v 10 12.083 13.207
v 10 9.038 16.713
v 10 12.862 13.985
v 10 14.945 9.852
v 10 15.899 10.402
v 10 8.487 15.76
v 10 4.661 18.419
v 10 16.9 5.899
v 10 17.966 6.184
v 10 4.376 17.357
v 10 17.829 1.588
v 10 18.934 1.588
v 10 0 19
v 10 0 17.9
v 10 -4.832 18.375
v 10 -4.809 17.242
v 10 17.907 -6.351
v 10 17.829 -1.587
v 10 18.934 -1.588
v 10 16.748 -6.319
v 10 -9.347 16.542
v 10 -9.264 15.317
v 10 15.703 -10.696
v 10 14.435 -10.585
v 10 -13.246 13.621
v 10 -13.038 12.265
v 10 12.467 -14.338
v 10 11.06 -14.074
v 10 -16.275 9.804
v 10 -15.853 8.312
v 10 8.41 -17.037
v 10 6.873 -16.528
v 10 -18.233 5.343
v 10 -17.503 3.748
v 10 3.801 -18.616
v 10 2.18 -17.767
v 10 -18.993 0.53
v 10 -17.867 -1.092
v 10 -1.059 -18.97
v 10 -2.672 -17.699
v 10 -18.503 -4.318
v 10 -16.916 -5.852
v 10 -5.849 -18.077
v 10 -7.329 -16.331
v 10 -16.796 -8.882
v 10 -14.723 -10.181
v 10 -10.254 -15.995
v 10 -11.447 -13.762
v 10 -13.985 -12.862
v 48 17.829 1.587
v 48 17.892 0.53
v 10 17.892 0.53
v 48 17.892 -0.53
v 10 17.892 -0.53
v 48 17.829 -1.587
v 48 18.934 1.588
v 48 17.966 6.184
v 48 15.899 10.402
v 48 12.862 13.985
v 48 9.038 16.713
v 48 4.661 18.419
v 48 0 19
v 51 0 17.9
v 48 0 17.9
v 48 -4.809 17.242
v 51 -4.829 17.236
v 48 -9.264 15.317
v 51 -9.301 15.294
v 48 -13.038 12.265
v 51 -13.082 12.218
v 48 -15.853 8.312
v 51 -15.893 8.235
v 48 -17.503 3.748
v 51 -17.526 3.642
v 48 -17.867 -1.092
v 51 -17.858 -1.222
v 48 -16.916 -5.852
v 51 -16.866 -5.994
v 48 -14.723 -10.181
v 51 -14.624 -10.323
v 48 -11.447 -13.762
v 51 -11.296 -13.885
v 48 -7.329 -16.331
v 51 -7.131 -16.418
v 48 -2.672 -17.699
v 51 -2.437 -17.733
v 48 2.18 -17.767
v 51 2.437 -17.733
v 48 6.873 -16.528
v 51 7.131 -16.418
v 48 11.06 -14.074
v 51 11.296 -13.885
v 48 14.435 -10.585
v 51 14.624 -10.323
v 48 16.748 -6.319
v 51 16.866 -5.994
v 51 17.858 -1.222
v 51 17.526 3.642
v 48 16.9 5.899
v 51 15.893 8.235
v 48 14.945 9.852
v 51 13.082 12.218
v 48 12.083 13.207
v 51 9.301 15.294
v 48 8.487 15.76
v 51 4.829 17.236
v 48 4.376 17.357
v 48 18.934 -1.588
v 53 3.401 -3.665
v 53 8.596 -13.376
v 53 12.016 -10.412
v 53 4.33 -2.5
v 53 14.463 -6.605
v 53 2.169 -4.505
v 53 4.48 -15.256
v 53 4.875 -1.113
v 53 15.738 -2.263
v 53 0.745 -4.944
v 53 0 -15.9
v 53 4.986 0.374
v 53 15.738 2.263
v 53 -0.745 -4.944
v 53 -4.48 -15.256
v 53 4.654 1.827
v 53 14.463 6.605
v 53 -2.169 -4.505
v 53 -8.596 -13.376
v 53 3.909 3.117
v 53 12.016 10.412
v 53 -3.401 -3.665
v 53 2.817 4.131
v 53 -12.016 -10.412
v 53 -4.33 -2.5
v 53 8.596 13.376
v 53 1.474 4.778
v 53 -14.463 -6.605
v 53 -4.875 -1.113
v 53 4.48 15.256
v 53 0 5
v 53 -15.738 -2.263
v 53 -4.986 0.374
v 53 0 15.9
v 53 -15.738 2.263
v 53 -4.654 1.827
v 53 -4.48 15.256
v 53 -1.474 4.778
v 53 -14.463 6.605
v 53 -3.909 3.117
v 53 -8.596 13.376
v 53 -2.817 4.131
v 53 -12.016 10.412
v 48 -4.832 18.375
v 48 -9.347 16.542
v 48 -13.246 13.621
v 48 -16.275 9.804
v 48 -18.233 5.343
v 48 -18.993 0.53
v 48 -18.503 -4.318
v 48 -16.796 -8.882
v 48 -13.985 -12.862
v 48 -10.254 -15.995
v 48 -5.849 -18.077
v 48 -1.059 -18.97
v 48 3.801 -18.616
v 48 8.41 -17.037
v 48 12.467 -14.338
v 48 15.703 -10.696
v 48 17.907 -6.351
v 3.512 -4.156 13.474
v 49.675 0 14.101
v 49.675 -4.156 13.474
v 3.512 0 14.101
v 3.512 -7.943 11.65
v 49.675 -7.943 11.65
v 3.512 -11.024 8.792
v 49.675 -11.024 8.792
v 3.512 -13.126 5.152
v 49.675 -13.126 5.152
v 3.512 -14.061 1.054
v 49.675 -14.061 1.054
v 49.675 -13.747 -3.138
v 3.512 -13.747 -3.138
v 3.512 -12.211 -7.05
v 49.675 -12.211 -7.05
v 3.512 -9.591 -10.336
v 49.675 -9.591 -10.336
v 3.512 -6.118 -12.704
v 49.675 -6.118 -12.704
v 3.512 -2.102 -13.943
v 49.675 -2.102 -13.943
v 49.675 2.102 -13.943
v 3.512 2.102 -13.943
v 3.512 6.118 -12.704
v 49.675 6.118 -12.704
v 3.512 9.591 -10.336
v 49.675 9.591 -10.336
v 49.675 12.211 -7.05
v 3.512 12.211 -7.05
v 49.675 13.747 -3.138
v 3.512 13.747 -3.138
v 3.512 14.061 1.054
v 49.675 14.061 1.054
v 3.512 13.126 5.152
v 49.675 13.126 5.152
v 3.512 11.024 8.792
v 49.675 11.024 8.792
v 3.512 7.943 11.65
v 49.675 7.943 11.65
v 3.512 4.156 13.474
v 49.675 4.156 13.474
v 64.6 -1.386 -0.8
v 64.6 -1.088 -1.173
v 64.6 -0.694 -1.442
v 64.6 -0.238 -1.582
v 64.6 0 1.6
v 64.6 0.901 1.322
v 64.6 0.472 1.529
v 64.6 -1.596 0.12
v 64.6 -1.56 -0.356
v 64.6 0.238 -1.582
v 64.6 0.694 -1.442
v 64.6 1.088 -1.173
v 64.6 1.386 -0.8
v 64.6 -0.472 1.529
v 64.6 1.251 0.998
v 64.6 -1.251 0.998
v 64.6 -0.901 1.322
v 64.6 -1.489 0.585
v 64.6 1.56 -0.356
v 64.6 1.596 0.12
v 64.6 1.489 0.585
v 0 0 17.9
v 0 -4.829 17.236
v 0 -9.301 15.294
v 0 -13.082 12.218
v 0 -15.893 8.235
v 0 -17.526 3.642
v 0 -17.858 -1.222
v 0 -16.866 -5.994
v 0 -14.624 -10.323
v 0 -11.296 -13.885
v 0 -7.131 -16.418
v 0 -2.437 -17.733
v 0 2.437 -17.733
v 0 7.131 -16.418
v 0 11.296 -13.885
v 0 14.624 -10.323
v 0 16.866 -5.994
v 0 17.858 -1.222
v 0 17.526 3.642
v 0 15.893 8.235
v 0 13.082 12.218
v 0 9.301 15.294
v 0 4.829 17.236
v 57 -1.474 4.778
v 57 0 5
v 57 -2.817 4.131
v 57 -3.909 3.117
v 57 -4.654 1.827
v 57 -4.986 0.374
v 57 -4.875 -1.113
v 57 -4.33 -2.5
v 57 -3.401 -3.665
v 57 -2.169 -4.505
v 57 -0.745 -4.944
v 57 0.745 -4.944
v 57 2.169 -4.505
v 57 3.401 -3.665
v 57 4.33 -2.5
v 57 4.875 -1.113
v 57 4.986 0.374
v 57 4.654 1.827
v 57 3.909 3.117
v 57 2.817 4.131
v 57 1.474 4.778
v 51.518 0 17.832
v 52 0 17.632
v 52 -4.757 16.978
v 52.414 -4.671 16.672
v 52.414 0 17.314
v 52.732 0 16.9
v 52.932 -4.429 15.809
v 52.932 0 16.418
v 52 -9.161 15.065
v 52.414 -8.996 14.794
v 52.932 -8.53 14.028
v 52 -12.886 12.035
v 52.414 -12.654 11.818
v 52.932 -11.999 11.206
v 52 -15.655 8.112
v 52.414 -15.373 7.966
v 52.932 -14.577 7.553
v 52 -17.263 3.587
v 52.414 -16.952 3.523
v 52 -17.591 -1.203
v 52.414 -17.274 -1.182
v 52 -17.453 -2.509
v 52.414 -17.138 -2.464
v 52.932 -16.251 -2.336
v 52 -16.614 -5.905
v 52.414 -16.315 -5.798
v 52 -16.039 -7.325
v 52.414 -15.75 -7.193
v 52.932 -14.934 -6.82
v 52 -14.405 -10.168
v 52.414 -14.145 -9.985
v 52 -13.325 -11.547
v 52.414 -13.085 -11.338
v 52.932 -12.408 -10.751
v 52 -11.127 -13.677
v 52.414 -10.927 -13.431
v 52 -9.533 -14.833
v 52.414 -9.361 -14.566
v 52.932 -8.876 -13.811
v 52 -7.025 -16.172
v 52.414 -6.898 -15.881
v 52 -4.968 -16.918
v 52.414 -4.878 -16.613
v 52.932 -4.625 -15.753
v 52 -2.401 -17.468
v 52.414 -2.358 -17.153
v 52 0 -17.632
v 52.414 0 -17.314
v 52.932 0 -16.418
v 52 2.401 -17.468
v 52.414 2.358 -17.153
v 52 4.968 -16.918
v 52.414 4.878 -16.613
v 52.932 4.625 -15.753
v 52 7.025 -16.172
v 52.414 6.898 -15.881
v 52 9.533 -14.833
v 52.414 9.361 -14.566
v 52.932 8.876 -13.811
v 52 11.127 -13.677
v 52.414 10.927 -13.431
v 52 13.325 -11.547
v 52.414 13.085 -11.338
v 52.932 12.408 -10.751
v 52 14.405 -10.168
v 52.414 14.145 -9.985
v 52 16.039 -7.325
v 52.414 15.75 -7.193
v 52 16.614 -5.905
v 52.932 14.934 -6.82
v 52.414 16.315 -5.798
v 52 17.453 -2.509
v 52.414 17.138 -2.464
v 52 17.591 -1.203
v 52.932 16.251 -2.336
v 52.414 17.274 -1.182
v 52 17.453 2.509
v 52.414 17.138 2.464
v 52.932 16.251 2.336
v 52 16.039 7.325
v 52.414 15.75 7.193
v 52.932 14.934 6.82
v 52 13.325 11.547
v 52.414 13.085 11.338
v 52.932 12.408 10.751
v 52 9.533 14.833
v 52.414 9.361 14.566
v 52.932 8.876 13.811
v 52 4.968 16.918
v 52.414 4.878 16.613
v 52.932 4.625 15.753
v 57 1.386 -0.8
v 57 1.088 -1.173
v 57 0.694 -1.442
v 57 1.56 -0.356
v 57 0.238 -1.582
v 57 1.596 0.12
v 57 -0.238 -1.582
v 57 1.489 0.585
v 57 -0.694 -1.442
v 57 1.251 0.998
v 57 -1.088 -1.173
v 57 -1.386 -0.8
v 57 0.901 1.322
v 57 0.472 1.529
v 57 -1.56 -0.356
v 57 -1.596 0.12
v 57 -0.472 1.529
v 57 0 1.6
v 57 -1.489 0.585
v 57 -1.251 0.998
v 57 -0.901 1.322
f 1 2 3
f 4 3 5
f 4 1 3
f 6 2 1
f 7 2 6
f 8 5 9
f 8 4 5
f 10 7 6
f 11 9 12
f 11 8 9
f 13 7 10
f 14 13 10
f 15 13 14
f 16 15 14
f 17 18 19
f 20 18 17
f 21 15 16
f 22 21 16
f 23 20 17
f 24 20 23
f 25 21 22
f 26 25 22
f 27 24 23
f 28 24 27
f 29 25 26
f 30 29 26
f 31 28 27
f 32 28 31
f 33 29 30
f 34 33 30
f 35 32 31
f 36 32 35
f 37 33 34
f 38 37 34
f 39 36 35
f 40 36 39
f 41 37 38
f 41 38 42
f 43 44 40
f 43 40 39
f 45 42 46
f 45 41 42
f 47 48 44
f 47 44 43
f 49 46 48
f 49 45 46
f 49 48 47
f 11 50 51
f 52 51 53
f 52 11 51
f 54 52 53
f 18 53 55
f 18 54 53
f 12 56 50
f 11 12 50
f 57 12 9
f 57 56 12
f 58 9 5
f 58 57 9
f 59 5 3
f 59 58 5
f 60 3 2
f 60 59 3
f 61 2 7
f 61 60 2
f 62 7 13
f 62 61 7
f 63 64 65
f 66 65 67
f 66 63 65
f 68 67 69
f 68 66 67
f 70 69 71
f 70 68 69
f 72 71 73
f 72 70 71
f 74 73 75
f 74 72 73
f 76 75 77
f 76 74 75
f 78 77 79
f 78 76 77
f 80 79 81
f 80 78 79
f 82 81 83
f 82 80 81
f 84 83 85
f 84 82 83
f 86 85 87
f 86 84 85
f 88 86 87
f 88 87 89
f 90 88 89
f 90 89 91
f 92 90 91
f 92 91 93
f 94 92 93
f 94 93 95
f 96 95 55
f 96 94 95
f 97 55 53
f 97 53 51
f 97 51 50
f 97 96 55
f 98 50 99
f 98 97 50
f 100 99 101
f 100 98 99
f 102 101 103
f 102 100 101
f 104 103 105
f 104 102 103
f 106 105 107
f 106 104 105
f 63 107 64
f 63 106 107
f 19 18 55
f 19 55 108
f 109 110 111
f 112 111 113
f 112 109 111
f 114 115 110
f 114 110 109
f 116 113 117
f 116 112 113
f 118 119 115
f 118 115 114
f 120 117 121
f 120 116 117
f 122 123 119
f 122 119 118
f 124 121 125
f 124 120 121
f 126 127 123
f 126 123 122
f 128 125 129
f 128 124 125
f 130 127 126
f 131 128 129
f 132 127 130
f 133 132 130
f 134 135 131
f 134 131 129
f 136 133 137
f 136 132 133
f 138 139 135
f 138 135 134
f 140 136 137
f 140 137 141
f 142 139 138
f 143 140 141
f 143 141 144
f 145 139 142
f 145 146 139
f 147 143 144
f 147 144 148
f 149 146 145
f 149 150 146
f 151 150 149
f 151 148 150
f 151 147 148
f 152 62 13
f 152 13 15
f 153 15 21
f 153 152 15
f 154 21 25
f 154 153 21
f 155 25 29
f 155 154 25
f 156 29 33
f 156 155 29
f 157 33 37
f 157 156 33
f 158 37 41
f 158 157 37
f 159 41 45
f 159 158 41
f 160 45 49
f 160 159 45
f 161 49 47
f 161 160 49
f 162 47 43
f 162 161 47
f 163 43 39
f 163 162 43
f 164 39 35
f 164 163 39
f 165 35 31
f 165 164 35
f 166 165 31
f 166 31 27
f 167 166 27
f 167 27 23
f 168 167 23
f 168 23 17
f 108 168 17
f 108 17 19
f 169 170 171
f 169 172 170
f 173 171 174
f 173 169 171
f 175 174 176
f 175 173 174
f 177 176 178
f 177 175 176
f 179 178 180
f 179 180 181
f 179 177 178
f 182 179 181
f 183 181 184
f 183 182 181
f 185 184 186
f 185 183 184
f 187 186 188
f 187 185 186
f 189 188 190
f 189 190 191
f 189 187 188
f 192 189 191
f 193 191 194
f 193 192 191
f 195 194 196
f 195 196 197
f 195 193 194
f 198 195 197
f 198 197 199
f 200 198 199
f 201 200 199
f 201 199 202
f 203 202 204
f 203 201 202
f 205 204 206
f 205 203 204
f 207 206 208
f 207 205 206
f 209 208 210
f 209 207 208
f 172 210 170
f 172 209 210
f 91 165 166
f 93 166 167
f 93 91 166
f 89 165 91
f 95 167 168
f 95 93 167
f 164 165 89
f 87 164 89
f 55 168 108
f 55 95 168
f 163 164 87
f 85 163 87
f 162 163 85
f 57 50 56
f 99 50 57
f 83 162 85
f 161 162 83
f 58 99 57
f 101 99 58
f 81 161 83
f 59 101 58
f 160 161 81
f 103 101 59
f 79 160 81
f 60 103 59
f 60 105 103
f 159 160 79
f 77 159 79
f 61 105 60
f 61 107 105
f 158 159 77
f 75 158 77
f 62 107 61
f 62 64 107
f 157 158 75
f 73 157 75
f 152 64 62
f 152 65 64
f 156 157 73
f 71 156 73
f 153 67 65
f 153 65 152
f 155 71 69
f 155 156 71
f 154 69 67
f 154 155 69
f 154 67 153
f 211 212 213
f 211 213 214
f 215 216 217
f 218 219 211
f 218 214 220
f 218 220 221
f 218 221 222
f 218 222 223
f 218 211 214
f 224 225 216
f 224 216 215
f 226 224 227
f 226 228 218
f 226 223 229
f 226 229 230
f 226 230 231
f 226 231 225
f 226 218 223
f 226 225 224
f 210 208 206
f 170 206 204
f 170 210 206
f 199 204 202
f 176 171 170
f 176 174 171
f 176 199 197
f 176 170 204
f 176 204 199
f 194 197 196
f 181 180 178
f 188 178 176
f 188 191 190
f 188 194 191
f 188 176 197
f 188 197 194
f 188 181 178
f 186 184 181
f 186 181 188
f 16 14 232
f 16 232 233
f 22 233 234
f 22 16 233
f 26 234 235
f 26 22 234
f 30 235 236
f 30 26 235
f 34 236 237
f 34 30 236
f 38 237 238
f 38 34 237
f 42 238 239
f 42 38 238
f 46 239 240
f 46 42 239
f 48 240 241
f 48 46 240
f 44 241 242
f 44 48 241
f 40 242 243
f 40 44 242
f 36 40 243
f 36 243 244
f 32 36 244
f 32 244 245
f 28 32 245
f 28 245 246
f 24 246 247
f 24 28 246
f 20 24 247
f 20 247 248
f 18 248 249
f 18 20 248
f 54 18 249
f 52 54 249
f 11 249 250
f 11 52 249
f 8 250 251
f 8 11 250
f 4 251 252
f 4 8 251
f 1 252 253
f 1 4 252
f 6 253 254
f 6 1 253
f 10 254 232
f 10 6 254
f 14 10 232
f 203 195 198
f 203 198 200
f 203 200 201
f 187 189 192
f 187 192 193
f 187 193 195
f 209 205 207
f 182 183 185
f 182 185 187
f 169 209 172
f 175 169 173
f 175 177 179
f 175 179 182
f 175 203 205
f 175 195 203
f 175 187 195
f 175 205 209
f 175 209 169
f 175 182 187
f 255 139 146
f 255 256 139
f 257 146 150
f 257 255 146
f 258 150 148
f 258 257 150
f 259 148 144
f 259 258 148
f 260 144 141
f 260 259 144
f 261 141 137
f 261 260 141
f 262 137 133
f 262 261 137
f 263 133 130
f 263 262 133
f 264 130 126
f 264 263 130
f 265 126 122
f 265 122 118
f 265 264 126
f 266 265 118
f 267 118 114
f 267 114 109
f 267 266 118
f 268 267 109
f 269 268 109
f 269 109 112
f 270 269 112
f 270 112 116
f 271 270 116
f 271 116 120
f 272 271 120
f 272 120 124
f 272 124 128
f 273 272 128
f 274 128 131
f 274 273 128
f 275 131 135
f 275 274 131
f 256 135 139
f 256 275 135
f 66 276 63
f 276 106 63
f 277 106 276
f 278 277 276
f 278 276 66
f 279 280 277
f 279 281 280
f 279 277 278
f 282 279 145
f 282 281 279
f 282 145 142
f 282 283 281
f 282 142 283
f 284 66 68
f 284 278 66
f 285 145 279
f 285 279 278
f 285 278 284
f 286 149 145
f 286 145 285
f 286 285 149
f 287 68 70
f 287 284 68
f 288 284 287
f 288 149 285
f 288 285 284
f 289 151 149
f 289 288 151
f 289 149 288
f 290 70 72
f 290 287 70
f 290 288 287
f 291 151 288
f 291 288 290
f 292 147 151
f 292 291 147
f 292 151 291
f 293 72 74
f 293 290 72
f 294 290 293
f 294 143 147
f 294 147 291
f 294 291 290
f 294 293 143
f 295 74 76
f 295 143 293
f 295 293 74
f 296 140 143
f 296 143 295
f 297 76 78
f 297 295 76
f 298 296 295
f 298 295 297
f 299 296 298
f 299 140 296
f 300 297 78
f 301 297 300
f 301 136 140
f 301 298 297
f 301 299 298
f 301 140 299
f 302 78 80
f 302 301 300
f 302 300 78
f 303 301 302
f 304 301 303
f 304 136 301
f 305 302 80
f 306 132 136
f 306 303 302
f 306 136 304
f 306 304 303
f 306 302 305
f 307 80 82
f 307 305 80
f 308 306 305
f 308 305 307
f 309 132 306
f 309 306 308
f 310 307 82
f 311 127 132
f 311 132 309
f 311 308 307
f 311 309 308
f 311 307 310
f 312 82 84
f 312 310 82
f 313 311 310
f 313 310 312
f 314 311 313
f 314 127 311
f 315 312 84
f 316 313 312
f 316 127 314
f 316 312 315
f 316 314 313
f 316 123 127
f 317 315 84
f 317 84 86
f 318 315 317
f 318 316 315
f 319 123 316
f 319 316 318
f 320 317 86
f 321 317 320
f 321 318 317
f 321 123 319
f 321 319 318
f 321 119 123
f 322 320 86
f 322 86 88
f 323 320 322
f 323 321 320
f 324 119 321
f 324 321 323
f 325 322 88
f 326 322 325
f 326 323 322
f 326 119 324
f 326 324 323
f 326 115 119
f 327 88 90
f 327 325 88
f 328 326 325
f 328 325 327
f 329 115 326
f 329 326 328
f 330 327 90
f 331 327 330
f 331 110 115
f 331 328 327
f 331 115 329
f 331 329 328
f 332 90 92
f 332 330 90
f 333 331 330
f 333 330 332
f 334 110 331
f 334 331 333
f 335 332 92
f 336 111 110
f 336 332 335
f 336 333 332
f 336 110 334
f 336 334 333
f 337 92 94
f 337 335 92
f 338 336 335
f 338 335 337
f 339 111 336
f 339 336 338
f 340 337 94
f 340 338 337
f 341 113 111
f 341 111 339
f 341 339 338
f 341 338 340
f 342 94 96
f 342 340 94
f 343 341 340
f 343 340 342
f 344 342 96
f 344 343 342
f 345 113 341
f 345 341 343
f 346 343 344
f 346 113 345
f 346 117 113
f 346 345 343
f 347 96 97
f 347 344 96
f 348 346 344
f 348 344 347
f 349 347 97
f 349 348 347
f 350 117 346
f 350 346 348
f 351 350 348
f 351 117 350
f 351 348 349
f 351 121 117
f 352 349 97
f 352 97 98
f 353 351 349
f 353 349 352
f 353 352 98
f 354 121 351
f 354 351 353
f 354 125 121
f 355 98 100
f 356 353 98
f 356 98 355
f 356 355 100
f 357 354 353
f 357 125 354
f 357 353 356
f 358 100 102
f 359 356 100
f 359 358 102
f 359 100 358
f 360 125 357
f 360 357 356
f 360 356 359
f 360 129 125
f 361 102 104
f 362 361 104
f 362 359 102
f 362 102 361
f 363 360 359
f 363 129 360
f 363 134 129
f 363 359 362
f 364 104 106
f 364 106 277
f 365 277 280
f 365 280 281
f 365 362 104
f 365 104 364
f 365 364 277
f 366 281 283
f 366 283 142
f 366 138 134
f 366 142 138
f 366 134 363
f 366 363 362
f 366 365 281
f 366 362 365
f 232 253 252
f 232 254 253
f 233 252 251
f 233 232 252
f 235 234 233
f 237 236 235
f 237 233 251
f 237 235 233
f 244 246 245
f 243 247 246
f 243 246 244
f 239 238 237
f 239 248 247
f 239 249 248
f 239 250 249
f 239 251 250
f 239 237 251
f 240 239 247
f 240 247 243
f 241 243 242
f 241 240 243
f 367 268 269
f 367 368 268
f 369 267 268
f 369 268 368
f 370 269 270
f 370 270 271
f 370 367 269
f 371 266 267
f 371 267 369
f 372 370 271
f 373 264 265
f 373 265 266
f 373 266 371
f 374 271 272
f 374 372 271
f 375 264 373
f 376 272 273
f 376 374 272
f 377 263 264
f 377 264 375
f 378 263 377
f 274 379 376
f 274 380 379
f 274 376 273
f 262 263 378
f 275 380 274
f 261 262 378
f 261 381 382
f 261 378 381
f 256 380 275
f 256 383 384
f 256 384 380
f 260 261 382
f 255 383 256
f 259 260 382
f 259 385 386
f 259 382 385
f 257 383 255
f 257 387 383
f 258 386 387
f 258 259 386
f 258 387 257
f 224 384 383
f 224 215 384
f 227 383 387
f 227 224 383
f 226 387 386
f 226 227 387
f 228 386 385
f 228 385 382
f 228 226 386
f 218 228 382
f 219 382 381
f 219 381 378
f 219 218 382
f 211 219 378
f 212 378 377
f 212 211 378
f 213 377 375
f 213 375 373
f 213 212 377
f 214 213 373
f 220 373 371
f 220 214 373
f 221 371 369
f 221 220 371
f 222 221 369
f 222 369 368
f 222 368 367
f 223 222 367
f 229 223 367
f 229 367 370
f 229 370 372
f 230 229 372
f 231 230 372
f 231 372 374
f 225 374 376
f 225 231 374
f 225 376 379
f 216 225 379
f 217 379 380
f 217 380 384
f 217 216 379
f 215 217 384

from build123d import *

# Parameters (mm, degrees)
CUT_EXTRUDE1_REACH = 62.854


with BuildPart() as part:
    # Sketch3 → Revolve1 (revolve)
    with BuildSketch(Plane.XY, mode=Mode.PRIVATE) as revolve1_sk:
        with BuildLine():
            Line((0, 0), (0, 17.9))
            Line((0, 17.9), (10, 17.9))
            Line((10, 17.9), (10, 19))
            Line((10, 19), (48, 19))
            Line((48, 19), (48, 17.9))
            Line((48, 17.9), (51, 17.9))
            ThreePointArc((51, 17.9), (52.414213562, 17.314213562), (53, 15.9))
            Line((53, 15.9), (53, 5))
            Line((53, 5), (57, 5))
            Line((57, 5), (57, 1.6))
            Line((57, 1.6), (64.6, 1.6))
            Line((64.6, 1.6), (64.6, 0))
            Line((64.6, 0), (49.67547572, 0))
            Line((49.67547572, 0), (49.67547572, 14.100571752))
            Line((49.67547572, 14.100571752), (3.511968533, 14.100571752))
            Line((3.511968533, 14.100571752), (3.511968533, 0))
            Line((3.511968533, 0), (0, 0))
        make_face()
    revolve(revolve1_sk.sketch.rotate(Axis((0, 0, 0), (1, 0, 0)), 90), axis=Axis((0, 0, 0), (1, 0, 0)))

    # Sketch4 → Cut-Extrude1 (cut, up to next)
    with BuildSketch(Plane.ZY.offset(-10), mode=Mode.PRIVATE) as cut_extrude1_sk1:
        with BuildLine():
            Line((1.5875, 18.933563947), (1.5875, 17.829465605))
            ThreePointArc((1.5875, 17.829465605), (0, 17.9), (-1.5875, 17.829465605))
            Line((-1.5875, 17.829465605), (-1.5875, 18.933563947))
            ThreePointArc((-1.5875, 18.933563947), (0, 19), (1.5875, 18.933563947))
        make_face()
    cut_extrude1_tool1 = extrude(cut_extrude1_sk1.sketch, amount=-CUT_EXTRUDE1_REACH, mode=Mode.PRIVATE) & part.part
    add(cut_extrude1_tool1.solids().sort_by_distance((10, 18.427166, 0))[0], mode=Mode.SUBTRACT)


solid = part.part
